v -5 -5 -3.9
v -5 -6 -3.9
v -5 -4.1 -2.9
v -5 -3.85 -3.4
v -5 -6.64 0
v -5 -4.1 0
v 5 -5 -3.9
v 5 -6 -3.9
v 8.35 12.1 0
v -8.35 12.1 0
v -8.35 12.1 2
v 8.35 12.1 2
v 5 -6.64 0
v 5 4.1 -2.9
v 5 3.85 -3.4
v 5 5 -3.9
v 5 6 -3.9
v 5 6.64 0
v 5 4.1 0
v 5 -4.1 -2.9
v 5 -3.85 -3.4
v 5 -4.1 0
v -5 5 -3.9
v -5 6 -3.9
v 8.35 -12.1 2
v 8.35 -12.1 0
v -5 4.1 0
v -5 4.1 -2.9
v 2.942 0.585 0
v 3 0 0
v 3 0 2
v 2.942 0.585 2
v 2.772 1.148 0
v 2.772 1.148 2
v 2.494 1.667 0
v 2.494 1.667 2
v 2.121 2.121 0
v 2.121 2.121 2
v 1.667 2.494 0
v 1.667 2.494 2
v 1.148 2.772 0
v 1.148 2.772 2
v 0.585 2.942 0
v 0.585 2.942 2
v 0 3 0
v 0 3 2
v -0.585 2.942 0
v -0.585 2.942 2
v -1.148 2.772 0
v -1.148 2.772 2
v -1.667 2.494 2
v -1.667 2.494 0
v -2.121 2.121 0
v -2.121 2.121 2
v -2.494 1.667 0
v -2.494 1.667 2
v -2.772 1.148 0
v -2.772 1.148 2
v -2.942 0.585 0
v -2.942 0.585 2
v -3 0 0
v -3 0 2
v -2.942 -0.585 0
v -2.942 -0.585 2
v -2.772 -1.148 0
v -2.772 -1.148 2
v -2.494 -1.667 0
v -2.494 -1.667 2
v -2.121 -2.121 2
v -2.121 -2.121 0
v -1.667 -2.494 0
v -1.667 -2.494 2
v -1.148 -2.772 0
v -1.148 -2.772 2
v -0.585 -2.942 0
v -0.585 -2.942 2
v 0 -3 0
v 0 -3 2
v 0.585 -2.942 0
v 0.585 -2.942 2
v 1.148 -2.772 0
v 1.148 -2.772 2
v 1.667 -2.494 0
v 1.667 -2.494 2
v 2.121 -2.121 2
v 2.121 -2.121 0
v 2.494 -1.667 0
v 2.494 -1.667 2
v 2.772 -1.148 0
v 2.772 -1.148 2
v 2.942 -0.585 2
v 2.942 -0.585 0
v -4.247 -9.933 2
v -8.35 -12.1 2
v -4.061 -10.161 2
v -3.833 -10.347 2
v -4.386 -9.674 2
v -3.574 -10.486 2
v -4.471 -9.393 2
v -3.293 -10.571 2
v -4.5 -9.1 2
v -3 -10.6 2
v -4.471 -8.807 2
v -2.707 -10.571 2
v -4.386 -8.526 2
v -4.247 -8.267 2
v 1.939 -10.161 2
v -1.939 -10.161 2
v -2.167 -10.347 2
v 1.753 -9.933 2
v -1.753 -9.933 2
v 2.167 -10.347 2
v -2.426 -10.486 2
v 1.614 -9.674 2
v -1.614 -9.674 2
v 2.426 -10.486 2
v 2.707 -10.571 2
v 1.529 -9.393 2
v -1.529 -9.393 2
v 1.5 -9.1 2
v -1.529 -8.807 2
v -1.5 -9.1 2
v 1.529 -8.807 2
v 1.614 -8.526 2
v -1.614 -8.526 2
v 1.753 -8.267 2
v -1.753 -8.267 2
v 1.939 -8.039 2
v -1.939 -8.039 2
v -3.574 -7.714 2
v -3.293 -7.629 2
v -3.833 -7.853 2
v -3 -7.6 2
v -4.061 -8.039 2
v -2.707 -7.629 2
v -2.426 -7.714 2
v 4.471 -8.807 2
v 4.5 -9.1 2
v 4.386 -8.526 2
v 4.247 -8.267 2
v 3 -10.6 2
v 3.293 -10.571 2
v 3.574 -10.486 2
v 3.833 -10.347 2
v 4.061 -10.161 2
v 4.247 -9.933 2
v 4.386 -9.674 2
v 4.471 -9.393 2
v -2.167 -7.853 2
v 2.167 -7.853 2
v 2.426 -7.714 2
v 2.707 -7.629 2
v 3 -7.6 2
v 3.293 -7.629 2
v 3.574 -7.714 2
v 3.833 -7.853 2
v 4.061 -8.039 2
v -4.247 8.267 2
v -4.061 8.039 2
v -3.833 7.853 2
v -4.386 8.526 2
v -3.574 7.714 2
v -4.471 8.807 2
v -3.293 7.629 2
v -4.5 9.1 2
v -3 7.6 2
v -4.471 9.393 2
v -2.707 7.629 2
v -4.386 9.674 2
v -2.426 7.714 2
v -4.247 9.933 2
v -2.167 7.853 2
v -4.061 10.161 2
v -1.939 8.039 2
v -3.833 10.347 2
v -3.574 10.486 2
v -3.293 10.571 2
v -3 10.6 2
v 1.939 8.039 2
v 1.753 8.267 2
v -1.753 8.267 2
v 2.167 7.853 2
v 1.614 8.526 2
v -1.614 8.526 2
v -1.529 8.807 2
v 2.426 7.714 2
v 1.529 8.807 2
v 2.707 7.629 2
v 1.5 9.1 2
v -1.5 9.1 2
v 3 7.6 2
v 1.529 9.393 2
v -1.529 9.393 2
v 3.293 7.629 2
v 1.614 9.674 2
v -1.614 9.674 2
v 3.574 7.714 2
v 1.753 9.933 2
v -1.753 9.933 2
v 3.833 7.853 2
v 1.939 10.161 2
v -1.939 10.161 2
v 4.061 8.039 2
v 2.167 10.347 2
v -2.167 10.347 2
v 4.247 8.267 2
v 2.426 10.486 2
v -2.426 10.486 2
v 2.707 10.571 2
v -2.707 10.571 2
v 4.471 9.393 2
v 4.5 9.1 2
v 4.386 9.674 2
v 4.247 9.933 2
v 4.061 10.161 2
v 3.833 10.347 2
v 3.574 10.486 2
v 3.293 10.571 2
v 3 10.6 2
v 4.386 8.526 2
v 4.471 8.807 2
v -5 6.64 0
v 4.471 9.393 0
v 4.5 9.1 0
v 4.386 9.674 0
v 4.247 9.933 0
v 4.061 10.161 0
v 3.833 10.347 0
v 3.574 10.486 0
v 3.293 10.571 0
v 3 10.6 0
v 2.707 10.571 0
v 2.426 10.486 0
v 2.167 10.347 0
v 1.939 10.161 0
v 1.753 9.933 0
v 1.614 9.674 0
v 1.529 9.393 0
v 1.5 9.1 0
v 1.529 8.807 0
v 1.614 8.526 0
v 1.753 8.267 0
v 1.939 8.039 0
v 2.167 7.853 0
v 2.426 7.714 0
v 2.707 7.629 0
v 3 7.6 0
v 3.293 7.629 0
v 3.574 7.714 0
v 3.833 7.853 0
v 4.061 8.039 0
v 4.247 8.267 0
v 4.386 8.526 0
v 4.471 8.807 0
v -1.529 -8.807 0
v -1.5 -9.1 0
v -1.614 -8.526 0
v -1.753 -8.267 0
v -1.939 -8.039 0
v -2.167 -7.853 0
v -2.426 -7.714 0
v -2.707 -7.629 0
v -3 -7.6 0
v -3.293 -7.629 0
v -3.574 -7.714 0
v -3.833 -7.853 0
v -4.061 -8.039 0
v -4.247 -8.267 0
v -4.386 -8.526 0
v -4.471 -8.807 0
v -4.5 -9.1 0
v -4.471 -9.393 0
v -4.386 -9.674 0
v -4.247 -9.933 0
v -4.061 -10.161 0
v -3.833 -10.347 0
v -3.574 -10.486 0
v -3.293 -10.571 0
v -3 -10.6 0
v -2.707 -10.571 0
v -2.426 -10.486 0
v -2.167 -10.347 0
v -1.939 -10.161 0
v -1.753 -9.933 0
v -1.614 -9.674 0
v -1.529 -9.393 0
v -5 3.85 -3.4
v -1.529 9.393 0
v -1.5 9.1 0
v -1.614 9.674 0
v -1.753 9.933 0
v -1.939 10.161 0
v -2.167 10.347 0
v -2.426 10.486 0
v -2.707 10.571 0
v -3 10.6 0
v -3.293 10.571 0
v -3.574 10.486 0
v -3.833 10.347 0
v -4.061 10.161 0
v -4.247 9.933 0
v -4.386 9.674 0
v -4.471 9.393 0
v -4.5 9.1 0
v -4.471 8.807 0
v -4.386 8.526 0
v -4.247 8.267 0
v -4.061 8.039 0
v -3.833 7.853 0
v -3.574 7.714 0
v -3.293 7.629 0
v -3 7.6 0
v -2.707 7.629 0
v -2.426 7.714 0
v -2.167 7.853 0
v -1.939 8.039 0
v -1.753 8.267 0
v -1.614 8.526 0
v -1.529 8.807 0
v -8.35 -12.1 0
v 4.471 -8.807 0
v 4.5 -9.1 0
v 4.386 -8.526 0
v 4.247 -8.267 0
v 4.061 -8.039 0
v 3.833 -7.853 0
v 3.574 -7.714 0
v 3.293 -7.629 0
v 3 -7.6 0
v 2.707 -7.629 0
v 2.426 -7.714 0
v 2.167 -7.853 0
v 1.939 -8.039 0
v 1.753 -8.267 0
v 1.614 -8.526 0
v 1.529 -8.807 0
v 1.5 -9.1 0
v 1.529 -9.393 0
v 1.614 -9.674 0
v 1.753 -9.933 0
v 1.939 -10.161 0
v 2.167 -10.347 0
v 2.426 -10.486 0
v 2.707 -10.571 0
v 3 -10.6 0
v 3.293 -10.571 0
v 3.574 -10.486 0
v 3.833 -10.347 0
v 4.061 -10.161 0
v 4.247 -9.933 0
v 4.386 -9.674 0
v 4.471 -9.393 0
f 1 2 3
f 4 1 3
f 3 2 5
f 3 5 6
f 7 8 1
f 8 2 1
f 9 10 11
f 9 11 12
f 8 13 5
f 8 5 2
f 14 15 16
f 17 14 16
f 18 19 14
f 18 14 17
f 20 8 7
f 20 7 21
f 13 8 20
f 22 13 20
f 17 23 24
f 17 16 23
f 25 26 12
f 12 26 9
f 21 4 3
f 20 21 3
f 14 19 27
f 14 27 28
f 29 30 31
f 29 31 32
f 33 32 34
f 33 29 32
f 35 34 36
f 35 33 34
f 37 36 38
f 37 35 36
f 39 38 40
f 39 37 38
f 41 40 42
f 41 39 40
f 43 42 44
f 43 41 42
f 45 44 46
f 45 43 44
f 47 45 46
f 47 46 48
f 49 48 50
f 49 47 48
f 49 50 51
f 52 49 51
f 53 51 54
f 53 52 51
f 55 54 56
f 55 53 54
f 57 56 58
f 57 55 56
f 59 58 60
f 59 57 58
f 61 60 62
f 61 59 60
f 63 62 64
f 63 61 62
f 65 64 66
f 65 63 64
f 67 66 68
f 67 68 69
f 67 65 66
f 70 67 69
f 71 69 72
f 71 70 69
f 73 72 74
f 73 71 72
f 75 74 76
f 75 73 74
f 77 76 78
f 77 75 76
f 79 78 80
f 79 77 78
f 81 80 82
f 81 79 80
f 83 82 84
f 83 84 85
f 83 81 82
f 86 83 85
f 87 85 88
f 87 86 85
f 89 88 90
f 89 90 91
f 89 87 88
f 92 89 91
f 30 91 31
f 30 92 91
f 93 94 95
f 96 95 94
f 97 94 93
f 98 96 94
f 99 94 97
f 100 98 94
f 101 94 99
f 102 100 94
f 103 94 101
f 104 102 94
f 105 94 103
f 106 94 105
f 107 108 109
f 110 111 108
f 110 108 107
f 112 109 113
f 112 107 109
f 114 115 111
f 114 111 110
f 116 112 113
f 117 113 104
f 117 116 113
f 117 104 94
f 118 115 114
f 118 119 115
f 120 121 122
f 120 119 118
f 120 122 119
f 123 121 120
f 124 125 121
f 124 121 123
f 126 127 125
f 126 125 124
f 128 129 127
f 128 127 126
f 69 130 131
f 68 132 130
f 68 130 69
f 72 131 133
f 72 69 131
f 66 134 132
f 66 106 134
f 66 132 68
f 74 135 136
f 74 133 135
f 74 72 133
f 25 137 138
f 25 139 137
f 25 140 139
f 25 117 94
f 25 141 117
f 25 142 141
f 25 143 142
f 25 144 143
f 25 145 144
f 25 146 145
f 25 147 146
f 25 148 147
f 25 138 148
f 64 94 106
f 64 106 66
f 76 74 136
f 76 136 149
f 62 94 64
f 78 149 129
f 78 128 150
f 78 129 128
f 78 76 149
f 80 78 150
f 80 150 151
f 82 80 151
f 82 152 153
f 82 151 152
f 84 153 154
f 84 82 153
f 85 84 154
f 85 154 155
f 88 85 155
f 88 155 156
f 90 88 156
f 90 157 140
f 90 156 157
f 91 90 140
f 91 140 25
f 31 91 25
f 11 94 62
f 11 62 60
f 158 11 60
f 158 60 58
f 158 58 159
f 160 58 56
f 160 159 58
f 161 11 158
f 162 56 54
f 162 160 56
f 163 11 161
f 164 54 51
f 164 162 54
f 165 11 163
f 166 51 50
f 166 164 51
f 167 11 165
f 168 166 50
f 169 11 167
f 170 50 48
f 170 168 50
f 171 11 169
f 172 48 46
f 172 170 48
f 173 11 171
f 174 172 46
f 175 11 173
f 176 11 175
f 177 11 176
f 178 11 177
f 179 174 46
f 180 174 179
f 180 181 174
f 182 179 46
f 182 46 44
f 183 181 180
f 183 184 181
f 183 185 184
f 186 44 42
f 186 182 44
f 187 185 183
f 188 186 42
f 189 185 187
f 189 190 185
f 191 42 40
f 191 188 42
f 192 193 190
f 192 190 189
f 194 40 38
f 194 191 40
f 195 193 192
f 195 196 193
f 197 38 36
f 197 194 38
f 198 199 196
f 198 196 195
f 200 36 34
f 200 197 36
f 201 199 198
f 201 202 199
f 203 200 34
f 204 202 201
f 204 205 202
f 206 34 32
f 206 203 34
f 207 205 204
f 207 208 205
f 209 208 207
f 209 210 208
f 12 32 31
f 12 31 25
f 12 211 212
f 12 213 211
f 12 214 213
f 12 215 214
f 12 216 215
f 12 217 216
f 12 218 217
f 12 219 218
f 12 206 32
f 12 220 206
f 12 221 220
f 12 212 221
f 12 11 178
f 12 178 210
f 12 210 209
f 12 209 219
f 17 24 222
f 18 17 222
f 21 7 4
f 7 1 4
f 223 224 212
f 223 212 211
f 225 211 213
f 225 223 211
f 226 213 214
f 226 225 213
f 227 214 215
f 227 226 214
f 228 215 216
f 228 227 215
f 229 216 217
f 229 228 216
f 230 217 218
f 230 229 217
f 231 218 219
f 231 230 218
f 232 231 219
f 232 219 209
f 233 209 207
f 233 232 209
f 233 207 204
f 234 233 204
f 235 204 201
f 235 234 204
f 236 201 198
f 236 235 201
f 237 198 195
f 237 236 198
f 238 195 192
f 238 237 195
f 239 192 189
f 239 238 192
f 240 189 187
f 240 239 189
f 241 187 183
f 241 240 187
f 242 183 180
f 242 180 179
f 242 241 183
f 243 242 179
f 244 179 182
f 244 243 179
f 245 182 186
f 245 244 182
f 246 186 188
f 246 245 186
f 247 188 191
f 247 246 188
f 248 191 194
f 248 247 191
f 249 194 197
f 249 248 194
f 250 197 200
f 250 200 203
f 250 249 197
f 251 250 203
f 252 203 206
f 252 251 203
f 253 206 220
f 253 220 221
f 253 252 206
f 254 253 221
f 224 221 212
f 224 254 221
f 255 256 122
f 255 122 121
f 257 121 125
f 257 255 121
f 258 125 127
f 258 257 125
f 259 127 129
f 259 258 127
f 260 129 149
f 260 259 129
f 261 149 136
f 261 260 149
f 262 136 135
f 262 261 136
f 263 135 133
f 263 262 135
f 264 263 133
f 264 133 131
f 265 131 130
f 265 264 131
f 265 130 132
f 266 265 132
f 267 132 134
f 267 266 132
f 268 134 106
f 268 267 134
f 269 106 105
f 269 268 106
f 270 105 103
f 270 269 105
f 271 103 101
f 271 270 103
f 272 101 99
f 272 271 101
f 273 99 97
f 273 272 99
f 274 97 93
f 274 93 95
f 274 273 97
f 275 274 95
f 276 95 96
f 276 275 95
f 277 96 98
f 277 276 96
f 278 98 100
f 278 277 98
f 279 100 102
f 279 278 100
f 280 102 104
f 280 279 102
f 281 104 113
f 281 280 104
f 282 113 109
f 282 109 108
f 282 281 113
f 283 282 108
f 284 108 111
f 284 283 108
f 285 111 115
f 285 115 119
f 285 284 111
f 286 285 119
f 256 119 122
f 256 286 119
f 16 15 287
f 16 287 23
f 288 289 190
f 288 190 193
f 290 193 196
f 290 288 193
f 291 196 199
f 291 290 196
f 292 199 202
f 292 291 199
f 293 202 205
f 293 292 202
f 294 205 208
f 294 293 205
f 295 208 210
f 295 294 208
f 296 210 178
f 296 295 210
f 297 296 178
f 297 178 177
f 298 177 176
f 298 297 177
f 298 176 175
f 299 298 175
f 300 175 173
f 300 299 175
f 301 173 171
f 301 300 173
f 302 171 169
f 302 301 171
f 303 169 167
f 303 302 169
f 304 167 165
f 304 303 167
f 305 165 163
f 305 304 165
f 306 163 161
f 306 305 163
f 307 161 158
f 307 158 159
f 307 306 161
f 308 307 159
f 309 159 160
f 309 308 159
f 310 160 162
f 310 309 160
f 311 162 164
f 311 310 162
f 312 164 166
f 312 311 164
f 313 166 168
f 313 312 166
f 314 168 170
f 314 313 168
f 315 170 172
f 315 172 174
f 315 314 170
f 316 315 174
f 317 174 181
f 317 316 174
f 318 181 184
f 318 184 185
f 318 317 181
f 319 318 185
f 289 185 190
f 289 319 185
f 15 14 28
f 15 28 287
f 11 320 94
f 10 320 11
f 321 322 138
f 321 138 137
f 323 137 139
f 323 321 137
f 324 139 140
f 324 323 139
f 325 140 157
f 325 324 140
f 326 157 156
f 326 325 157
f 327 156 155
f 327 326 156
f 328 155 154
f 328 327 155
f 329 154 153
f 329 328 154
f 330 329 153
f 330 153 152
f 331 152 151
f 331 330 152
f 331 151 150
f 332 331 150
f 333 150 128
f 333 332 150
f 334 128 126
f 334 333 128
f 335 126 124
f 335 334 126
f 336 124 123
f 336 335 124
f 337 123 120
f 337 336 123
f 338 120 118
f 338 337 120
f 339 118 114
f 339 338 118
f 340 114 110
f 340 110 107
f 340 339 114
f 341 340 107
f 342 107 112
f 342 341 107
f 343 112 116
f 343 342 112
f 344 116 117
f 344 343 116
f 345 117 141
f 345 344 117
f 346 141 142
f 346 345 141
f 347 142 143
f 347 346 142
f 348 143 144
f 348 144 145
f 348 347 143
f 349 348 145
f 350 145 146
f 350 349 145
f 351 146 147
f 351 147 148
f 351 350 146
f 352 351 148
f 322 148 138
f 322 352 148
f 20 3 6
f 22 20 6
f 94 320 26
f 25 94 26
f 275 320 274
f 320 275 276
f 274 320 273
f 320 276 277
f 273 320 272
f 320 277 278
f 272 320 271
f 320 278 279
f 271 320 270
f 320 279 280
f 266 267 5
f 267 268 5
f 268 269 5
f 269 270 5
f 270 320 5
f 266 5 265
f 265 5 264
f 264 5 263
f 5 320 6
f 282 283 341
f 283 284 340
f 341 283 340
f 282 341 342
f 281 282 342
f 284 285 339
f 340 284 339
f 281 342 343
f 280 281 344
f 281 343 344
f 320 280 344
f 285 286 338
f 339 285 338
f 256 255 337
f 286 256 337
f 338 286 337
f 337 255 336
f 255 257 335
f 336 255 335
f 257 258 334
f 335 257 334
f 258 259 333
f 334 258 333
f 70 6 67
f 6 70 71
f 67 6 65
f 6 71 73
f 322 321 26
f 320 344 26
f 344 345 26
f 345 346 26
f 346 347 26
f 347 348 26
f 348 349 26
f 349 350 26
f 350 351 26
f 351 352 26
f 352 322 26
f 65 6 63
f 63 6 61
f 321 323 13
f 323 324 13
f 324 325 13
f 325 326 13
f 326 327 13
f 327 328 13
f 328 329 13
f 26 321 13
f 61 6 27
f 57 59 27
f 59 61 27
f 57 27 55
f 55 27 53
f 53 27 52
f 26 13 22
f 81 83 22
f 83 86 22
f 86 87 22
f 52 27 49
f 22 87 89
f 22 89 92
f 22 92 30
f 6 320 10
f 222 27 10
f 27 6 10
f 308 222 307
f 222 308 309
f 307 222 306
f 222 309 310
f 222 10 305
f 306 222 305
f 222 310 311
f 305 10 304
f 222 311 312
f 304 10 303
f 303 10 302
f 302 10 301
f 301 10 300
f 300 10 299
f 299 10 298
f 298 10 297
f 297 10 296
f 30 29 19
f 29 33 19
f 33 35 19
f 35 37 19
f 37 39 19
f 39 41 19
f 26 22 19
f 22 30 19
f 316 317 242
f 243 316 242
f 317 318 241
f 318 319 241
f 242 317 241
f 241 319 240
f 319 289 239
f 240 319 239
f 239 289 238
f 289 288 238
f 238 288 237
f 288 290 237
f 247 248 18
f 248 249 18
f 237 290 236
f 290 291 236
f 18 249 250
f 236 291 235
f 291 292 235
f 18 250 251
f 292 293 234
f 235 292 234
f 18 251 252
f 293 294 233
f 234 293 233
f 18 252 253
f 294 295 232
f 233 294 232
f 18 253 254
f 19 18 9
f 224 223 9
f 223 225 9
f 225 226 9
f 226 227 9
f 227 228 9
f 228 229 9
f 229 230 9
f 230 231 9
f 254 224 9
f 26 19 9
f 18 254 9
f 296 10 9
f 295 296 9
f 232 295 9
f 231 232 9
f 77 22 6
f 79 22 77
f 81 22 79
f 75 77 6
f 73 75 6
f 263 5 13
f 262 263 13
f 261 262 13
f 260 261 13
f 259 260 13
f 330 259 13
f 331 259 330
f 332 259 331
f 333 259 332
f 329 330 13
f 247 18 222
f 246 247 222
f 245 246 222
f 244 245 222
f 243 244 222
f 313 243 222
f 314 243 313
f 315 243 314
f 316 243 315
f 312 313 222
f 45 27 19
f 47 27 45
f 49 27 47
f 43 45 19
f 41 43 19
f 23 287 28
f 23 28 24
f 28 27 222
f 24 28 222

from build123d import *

# Parameters (mm, degrees)
F0_W     = 16.7
F0_H     = 24.2
F0_R     = 1.5
F0_R_2   = 3
F1_DEPTH = 2
F4_DEPTH = 5


with BuildPart() as f1:
    # F0 (on Top) → F1 (new body)
    with BuildSketch(Plane.XY):
        Rectangle(F0_W, F0_H)
        with Locations((-3, -9.1)):
            Circle(F0_R, mode=Mode.SUBTRACT)
        with Locations((3, -9.1)):
            Circle(F0_R, mode=Mode.SUBTRACT)
        with Locations((-3, 9.1)):
            Circle(F0_R, mode=Mode.SUBTRACT)
        Circle(F0_R_2, mode=Mode.SUBTRACT)
        with Locations((3, 9.1)):
            Circle(F0_R, mode=Mode.SUBTRACT)
    extrude(amount=F1_DEPTH)

    # F3 (on Right) → F4 (join, symmetric)
    with BuildSketch(Plane.YZ):
        Polygon((-4.1, 0), (-6.64, 0), (-6, -3.9), (-5, -3.9), (-3.85, -3.4), (-4.1, -2.9), align=None)
        Polygon((6.64, 0), (4.1, 0), (4.1, -2.9), (3.85, -3.4), (5, -3.9), (6, -3.9), align=None)
    extrude(amount=F4_DEPTH, both=True)


solid = f1.part
